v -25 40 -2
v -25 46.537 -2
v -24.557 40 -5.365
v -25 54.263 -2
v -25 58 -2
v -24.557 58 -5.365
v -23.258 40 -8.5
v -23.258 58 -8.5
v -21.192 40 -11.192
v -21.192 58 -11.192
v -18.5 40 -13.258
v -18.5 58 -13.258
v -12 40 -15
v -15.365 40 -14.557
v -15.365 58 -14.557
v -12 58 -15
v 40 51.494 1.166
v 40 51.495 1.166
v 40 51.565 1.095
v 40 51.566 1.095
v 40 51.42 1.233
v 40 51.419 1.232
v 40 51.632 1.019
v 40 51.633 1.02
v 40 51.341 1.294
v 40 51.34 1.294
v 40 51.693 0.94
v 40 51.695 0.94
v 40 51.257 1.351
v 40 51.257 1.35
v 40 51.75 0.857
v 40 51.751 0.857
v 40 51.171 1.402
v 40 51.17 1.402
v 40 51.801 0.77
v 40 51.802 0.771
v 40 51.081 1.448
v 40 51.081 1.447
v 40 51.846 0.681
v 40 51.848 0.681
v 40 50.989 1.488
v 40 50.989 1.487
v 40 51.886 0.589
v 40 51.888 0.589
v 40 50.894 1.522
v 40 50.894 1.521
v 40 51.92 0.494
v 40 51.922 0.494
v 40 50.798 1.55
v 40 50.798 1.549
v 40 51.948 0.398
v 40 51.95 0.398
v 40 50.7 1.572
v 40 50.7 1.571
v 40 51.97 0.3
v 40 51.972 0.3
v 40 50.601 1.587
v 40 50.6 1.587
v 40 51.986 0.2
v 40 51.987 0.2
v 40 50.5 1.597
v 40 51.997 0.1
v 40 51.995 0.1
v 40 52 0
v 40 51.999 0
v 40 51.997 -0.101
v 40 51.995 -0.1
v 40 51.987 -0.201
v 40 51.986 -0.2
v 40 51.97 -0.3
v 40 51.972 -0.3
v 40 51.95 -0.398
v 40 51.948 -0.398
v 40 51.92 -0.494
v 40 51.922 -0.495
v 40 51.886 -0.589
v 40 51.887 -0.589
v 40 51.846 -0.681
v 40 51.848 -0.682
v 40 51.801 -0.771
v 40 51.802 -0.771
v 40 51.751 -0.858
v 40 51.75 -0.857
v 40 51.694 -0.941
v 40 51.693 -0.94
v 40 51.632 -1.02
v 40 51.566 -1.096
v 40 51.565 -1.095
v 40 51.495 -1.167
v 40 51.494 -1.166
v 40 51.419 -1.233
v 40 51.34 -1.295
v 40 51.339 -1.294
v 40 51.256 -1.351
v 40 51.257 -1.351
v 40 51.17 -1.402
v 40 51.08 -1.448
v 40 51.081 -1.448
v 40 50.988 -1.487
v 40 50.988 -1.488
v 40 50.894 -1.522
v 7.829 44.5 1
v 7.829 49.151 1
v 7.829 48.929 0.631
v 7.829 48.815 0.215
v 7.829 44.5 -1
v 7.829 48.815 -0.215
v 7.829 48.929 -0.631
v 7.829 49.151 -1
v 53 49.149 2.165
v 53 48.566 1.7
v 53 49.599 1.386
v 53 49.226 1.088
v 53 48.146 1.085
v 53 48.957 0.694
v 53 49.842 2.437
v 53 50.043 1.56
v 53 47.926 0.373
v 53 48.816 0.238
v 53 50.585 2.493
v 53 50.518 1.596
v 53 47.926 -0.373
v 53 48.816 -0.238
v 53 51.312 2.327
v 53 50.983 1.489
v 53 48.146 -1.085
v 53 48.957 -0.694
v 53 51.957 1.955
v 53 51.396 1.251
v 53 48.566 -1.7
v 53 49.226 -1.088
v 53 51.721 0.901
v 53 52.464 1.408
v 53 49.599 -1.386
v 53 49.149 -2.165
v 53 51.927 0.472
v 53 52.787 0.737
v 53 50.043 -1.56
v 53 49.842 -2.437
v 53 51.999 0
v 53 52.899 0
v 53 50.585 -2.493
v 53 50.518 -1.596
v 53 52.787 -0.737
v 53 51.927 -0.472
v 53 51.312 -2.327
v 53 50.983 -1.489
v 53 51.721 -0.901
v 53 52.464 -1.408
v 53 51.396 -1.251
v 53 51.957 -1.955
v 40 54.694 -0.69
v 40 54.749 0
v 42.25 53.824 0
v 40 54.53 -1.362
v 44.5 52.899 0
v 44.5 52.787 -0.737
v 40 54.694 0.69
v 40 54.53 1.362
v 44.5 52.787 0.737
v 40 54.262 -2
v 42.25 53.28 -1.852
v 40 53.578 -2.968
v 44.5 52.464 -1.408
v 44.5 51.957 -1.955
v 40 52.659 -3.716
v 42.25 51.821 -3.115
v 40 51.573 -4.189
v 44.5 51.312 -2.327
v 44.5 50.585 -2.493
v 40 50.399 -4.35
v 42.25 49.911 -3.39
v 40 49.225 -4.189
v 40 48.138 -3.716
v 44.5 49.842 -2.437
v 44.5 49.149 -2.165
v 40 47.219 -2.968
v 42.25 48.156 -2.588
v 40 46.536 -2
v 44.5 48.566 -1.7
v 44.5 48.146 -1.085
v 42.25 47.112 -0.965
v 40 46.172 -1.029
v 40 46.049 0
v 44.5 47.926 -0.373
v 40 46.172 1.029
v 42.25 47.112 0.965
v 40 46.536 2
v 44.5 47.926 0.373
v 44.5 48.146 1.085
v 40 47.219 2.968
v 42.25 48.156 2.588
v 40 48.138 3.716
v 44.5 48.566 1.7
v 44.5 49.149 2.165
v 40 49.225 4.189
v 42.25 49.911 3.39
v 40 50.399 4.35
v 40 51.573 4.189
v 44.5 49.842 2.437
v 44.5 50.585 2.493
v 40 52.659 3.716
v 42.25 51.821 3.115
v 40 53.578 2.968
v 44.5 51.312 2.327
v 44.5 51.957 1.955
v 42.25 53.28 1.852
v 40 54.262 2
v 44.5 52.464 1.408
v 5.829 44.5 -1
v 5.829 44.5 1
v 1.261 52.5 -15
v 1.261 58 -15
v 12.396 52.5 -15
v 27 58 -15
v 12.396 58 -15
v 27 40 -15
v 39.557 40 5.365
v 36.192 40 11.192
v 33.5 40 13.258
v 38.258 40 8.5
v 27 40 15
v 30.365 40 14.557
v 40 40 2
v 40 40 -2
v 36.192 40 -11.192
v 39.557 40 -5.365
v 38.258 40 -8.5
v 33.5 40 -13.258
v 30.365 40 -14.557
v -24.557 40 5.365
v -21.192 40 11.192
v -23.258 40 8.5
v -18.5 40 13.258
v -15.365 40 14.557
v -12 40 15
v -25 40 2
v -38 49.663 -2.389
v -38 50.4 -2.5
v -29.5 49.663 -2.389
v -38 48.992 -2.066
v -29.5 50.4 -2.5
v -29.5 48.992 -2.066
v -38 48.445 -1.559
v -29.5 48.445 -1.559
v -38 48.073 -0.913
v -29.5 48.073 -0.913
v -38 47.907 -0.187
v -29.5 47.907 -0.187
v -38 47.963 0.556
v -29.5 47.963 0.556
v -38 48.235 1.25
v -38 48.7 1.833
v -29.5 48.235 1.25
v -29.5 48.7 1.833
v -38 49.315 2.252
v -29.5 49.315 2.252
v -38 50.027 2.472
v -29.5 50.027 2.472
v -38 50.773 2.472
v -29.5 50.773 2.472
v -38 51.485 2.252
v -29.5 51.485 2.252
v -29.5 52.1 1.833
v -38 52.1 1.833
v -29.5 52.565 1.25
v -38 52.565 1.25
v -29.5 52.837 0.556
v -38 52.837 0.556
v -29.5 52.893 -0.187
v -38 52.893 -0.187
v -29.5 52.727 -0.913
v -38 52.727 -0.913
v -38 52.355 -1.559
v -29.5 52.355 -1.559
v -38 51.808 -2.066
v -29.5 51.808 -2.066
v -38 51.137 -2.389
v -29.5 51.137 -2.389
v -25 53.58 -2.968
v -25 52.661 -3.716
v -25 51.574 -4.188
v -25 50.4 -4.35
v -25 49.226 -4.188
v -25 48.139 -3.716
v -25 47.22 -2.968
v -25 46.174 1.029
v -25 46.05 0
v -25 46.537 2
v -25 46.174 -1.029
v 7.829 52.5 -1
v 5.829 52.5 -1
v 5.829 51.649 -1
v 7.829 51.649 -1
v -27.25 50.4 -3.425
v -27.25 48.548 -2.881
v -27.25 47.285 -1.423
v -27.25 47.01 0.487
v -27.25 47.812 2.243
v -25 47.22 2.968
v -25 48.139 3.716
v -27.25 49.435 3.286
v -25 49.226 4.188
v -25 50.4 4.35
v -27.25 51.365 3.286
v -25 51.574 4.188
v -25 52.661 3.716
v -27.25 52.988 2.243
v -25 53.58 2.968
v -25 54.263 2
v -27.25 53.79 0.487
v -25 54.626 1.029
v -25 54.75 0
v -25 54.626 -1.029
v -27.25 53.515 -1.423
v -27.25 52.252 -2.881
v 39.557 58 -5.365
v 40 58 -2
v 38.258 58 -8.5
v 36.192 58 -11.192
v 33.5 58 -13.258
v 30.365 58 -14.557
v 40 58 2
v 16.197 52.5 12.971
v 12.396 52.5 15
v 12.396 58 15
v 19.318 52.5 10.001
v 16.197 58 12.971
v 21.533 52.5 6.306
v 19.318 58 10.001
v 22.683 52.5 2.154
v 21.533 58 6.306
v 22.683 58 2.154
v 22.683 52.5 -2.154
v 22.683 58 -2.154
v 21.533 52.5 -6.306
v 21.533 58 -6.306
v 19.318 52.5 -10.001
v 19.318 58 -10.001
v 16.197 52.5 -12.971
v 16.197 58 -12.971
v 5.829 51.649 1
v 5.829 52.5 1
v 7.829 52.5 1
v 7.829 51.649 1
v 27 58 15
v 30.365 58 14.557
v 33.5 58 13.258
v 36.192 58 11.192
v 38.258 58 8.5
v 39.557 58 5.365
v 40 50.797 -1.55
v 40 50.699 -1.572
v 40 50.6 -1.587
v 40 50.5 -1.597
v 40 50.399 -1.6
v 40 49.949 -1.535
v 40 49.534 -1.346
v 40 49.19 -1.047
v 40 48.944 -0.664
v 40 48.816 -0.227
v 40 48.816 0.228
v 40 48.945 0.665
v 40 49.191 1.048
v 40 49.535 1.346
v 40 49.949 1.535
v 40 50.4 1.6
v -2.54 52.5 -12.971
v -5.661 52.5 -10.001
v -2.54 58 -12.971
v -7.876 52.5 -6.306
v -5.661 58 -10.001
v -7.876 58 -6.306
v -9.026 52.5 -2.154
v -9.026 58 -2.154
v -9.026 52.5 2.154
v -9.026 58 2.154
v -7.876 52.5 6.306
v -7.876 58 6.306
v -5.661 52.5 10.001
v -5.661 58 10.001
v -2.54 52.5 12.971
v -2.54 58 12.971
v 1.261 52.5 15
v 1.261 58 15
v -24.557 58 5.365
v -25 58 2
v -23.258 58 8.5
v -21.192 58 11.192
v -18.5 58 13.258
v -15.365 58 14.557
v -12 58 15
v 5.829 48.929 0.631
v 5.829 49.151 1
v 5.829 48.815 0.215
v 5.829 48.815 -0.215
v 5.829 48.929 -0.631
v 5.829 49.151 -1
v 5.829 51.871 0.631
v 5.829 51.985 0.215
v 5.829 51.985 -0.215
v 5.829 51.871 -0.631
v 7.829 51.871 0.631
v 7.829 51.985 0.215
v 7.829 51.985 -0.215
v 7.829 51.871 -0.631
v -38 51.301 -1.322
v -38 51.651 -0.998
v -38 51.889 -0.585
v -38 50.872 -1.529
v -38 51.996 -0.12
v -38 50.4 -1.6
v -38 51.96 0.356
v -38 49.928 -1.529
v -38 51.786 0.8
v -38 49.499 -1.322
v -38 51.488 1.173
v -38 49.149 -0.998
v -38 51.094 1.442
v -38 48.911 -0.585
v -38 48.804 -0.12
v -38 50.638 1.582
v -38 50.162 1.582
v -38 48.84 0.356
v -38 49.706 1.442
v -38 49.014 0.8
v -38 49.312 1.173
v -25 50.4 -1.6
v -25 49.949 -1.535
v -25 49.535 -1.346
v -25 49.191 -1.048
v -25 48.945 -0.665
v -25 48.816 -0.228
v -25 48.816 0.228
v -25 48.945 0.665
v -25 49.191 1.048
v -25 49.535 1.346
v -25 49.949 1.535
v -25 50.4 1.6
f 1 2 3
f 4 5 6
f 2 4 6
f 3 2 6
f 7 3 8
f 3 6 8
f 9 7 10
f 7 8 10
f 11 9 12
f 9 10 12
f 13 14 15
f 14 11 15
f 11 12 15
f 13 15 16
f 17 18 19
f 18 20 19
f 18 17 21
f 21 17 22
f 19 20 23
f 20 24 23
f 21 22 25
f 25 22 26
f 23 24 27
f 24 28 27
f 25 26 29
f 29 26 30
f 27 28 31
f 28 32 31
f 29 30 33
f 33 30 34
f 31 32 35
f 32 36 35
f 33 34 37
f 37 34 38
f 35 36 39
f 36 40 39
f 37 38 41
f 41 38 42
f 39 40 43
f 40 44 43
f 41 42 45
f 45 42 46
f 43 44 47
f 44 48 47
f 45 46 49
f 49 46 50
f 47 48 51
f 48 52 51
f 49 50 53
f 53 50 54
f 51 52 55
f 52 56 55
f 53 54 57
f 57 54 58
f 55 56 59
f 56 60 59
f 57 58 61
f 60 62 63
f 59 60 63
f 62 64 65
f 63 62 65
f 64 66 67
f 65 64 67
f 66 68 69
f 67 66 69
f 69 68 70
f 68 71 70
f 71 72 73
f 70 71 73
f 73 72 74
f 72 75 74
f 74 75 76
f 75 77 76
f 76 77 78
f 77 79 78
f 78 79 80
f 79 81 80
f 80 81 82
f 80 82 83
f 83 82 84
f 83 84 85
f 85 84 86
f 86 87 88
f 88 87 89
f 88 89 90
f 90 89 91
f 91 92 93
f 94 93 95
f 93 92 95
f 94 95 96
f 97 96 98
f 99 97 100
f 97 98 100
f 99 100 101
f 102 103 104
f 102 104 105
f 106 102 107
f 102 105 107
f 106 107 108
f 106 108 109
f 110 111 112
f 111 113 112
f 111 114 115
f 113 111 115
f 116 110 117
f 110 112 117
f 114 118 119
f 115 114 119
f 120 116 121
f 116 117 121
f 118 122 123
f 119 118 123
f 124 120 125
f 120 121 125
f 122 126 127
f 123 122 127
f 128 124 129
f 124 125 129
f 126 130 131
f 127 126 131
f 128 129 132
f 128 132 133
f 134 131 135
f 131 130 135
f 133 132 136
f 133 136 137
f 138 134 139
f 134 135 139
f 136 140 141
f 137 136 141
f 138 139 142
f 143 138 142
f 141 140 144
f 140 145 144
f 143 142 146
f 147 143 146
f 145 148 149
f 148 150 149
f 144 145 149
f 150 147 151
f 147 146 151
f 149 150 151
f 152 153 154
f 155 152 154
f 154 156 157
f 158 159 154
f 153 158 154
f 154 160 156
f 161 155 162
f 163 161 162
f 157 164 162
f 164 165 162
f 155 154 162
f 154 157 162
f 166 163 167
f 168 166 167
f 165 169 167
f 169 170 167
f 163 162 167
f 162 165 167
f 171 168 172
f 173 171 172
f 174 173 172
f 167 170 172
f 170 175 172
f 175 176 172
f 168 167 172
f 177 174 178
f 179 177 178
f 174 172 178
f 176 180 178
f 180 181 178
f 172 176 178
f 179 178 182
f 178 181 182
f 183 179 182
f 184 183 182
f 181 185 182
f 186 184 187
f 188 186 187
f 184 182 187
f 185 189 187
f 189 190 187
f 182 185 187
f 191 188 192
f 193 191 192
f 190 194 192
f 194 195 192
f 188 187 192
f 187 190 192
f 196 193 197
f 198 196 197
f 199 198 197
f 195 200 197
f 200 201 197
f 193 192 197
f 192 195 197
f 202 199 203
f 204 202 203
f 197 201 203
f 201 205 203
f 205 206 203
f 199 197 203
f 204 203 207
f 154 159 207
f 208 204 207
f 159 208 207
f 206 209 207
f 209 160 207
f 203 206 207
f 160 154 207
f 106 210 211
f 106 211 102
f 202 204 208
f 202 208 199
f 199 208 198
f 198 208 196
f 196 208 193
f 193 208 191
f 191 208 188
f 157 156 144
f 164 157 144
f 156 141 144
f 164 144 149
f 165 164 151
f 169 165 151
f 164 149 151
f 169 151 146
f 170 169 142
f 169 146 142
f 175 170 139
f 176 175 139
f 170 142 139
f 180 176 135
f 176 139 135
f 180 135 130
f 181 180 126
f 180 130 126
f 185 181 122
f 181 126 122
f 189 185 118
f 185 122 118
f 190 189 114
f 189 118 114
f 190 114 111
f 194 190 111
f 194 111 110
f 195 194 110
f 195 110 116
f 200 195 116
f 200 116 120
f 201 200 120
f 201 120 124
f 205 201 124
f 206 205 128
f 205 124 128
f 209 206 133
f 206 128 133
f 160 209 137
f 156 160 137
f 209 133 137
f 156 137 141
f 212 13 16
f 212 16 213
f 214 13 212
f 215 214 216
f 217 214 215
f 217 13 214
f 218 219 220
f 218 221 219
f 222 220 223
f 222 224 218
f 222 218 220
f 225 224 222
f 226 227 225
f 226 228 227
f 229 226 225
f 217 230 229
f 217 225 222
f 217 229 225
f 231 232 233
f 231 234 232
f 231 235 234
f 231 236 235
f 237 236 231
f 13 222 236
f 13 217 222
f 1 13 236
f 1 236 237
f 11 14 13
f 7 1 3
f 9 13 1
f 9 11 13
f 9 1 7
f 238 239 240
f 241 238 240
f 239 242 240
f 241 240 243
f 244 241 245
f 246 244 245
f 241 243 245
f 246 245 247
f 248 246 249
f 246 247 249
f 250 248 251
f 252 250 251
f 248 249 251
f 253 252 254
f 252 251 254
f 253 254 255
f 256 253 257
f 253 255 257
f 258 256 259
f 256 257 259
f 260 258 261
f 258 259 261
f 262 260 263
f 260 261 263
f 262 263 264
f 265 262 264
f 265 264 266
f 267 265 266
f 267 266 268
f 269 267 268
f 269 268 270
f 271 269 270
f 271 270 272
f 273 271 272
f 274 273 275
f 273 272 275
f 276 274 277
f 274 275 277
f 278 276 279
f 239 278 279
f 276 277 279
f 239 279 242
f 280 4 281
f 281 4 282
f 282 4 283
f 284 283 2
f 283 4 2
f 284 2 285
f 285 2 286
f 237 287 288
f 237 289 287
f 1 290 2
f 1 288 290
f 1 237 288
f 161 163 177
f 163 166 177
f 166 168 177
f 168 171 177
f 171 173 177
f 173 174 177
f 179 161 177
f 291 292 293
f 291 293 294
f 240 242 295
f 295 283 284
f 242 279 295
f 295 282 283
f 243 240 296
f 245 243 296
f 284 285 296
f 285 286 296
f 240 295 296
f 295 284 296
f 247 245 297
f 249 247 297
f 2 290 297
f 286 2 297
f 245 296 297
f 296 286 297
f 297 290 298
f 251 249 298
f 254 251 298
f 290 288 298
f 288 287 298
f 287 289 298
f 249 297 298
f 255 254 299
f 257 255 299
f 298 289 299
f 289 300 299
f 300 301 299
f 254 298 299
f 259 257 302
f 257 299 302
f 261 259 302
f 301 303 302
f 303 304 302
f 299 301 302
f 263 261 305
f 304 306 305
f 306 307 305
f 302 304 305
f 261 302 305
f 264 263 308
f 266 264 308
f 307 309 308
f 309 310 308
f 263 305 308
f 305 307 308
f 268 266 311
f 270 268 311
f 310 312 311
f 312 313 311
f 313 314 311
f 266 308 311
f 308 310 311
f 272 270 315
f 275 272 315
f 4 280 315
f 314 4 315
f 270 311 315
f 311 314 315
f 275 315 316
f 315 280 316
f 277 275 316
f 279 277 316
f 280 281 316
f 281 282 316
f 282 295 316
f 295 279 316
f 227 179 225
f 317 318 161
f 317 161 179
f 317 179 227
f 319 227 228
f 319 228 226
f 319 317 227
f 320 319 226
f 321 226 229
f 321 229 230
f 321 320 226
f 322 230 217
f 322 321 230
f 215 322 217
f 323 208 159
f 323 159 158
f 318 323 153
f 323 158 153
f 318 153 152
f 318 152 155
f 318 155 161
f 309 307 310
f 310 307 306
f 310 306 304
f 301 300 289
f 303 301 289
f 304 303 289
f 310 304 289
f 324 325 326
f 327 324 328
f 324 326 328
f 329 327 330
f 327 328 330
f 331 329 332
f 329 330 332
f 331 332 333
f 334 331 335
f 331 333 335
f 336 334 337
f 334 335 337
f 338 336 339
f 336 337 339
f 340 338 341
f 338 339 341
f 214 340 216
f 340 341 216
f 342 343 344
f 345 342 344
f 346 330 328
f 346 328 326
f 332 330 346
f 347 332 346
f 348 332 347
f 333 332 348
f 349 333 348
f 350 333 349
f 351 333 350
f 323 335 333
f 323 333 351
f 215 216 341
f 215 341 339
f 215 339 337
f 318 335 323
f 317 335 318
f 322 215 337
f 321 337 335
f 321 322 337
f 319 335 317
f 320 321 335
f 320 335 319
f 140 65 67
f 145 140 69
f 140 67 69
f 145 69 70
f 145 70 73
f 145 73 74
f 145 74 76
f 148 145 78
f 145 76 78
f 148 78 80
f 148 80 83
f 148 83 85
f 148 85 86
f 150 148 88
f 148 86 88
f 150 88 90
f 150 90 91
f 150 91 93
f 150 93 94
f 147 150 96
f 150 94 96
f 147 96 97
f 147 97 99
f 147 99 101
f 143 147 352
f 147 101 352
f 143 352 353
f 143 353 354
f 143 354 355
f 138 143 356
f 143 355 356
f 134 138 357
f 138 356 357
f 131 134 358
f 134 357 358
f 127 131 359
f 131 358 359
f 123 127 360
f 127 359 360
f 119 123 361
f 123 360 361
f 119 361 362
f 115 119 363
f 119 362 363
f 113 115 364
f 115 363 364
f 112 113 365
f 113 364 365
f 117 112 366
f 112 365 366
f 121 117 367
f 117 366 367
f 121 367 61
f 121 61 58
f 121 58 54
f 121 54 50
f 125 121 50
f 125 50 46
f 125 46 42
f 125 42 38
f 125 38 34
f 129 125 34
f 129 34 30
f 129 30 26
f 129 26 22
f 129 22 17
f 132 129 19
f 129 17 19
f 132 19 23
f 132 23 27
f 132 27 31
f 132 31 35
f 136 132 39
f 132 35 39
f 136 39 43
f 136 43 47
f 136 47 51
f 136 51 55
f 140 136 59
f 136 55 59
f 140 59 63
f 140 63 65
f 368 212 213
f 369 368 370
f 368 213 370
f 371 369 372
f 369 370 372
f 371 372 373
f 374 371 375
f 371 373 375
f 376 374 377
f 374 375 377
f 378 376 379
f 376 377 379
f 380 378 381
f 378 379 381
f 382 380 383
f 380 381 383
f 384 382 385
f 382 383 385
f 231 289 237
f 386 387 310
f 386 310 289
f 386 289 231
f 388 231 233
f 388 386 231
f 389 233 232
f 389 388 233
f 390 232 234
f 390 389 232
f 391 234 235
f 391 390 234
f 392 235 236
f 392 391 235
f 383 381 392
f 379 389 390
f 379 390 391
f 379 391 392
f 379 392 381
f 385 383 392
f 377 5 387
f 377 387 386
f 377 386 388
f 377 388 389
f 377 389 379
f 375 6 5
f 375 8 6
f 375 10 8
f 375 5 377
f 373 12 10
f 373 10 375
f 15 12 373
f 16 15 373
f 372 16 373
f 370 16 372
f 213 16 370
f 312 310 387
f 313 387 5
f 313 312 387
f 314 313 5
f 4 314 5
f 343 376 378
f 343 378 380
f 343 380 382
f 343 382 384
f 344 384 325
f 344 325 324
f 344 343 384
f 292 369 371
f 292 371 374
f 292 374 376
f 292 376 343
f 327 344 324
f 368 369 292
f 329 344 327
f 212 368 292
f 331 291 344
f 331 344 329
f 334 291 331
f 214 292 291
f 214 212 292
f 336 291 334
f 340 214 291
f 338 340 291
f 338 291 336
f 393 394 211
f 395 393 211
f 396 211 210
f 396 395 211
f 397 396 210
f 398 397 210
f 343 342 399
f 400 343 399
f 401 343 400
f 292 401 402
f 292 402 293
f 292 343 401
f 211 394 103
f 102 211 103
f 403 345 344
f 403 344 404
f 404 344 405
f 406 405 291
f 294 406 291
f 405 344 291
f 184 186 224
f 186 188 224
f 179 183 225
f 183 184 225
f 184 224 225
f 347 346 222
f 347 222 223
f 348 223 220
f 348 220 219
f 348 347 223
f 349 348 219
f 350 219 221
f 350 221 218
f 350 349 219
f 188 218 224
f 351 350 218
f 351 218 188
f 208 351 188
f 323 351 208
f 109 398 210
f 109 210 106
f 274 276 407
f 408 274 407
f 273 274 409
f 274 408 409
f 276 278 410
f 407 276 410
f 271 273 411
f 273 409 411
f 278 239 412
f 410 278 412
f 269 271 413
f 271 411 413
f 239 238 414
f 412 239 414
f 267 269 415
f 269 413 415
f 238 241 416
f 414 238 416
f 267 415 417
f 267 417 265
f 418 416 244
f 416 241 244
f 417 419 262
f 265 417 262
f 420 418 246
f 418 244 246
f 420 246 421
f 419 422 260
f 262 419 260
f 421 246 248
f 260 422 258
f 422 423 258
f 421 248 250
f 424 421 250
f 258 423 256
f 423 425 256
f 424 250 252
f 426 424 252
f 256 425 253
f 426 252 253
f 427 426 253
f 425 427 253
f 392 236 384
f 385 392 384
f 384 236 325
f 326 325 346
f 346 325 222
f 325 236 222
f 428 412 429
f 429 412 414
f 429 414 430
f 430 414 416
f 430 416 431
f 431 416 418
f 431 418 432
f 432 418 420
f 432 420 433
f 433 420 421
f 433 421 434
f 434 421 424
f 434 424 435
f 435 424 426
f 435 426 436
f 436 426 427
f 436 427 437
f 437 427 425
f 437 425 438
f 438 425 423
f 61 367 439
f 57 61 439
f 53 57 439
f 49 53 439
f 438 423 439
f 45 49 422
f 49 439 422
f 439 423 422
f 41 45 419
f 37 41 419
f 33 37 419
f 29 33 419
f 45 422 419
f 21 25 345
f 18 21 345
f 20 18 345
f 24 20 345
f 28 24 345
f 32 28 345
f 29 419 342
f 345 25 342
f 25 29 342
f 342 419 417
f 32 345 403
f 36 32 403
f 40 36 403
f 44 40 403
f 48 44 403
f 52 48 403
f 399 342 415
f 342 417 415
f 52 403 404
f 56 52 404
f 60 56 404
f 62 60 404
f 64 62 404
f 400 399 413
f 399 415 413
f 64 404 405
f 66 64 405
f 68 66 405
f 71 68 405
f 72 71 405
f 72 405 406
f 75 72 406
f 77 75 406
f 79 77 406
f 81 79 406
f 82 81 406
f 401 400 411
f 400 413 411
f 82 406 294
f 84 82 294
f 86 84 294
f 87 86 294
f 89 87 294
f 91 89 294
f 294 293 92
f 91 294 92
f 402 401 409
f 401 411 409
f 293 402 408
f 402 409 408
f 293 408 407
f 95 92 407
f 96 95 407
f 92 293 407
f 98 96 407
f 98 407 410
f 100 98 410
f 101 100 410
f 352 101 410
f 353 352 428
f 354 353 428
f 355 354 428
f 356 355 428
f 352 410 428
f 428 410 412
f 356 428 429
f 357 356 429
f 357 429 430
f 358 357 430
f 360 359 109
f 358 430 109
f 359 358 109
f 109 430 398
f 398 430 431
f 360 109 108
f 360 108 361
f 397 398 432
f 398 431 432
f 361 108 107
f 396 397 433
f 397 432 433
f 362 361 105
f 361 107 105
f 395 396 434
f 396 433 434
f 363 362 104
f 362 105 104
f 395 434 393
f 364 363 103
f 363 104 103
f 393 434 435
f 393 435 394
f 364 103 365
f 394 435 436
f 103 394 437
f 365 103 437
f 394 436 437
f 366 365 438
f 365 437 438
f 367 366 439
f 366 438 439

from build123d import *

# Parameters (mm, degrees)
SKETCH1_W           = 65
SKETCH1_H           = 30
BOSS_EXTRUDE1_DEPTH = 58
FILLET1_R           = 13
SKETCH15_W          = 83.696095513
SKETCH15_H          = 31.69844841
CUT_EXTRUDE7_DEPTH  = 50
SKETCH18_R          = 16
CUT_EXTRUDE10_DEPTH = 5.5
CUT_EXTRUDE12_REACH = 90.397
SKETCH3_R           = 1.6
SKETCH21_W          = 2
SKETCH21_H          = 2
CUT_EXTRUDE13_DEPTH = 8


with BuildPart() as part:
    # Sketch1 → Boss-Extrude1 (new body)
    with BuildSketch(Plane(origin=(0, 0, 0), x_dir=(1, 0, 0), z_dir=(0, 1, 0))):
        with Locations((7.5, 0)):
            Rectangle(SKETCH1_W, SKETCH1_H)
    extrude(amount=BOSS_EXTRUDE1_DEPTH)

    # Fillet1
    fillet1_edges = [part.edges().sort_by_distance(p)[0] for p in [
        (40, 29, -15),
        (-25, 29, -15),
        (40, 29, 15),
        (-25, 29, 15),
    ]]
    fillet(fillet1_edges, radius=FILLET1_R)

    # Sketch15 → Cut-Extrude7 (cut)
    with BuildSketch(Plane(origin=(0, -10, 0), x_dir=(-1, 0, 0), z_dir=(0, -1, 0))):
        with Locations((-0.057440767, 0.030479277)):
            Rectangle(SKETCH15_W, SKETCH15_H)
    extrude(amount=-CUT_EXTRUDE7_DEPTH, mode=Mode.SUBTRACT)

    # Sketch18 → Cut-Extrude10 (cut)
    with BuildSketch(Plane(origin=(0, 58, 0), x_dir=(1, 0, 0), z_dir=(0, 1, 0))):
        with Locations((6.828508286, 0)):
            Circle(SKETCH18_R)
    extrude(amount=-CUT_EXTRUDE10_DEPTH, mode=Mode.SUBTRACT)

    # Sketch3 → Cut-Extrude12 (cut, up to next)
    with BuildSketch(Plane.ZY.offset(25), mode=Mode.PRIVATE) as cut_extrude12_sk1:
        with Locations((0, 50.4)):
            Circle(SKETCH3_R)
    cut_extrude12_tool1 = extrude(cut_extrude12_sk1.sketch, amount=-CUT_EXTRUDE12_REACH, mode=Mode.PRIVATE) & part.part
    add(cut_extrude12_tool1.solids().sort_by_distance((-25, 50.4, 0))[0], mode=Mode.SUBTRACT)

    # Sketch21 → Cut-Extrude13 (cut)
    with BuildSketch(Plane(origin=(0, 52.5, 0), x_dir=(1, 0, 0), z_dir=(0, 1, 0))):
        with Locations((6.828508286, 0)):
            Rectangle(SKETCH21_W, SKETCH21_H)
    extrude(amount=-CUT_EXTRUDE13_DEPTH, mode=Mode.SUBTRACT)

    # Sketch24 → Revolve1 (revolve)
    with BuildSketch(Plane.XY):
        Polygon((-25, 52), (-38, 52), (-38, 52.9), (-29.5, 52.9), (-25, 54.749890762), align=None)
    revolve(axis=Axis((-25, 50.4, 0), (-1, 0, 0)))

    # Sketch25 → Revolve2 (revolve)
    with BuildSketch(Plane.XY):
        Polygon((40, 51.99856611), (40, 54.74856611), (44.5, 52.89856611), (53, 52.89856611), (53, 51.99856611), align=None)
    revolve(axis=Axis((50.482197819, 50.39856611, 0), (-1, 0, 0)))


solid = part.part
